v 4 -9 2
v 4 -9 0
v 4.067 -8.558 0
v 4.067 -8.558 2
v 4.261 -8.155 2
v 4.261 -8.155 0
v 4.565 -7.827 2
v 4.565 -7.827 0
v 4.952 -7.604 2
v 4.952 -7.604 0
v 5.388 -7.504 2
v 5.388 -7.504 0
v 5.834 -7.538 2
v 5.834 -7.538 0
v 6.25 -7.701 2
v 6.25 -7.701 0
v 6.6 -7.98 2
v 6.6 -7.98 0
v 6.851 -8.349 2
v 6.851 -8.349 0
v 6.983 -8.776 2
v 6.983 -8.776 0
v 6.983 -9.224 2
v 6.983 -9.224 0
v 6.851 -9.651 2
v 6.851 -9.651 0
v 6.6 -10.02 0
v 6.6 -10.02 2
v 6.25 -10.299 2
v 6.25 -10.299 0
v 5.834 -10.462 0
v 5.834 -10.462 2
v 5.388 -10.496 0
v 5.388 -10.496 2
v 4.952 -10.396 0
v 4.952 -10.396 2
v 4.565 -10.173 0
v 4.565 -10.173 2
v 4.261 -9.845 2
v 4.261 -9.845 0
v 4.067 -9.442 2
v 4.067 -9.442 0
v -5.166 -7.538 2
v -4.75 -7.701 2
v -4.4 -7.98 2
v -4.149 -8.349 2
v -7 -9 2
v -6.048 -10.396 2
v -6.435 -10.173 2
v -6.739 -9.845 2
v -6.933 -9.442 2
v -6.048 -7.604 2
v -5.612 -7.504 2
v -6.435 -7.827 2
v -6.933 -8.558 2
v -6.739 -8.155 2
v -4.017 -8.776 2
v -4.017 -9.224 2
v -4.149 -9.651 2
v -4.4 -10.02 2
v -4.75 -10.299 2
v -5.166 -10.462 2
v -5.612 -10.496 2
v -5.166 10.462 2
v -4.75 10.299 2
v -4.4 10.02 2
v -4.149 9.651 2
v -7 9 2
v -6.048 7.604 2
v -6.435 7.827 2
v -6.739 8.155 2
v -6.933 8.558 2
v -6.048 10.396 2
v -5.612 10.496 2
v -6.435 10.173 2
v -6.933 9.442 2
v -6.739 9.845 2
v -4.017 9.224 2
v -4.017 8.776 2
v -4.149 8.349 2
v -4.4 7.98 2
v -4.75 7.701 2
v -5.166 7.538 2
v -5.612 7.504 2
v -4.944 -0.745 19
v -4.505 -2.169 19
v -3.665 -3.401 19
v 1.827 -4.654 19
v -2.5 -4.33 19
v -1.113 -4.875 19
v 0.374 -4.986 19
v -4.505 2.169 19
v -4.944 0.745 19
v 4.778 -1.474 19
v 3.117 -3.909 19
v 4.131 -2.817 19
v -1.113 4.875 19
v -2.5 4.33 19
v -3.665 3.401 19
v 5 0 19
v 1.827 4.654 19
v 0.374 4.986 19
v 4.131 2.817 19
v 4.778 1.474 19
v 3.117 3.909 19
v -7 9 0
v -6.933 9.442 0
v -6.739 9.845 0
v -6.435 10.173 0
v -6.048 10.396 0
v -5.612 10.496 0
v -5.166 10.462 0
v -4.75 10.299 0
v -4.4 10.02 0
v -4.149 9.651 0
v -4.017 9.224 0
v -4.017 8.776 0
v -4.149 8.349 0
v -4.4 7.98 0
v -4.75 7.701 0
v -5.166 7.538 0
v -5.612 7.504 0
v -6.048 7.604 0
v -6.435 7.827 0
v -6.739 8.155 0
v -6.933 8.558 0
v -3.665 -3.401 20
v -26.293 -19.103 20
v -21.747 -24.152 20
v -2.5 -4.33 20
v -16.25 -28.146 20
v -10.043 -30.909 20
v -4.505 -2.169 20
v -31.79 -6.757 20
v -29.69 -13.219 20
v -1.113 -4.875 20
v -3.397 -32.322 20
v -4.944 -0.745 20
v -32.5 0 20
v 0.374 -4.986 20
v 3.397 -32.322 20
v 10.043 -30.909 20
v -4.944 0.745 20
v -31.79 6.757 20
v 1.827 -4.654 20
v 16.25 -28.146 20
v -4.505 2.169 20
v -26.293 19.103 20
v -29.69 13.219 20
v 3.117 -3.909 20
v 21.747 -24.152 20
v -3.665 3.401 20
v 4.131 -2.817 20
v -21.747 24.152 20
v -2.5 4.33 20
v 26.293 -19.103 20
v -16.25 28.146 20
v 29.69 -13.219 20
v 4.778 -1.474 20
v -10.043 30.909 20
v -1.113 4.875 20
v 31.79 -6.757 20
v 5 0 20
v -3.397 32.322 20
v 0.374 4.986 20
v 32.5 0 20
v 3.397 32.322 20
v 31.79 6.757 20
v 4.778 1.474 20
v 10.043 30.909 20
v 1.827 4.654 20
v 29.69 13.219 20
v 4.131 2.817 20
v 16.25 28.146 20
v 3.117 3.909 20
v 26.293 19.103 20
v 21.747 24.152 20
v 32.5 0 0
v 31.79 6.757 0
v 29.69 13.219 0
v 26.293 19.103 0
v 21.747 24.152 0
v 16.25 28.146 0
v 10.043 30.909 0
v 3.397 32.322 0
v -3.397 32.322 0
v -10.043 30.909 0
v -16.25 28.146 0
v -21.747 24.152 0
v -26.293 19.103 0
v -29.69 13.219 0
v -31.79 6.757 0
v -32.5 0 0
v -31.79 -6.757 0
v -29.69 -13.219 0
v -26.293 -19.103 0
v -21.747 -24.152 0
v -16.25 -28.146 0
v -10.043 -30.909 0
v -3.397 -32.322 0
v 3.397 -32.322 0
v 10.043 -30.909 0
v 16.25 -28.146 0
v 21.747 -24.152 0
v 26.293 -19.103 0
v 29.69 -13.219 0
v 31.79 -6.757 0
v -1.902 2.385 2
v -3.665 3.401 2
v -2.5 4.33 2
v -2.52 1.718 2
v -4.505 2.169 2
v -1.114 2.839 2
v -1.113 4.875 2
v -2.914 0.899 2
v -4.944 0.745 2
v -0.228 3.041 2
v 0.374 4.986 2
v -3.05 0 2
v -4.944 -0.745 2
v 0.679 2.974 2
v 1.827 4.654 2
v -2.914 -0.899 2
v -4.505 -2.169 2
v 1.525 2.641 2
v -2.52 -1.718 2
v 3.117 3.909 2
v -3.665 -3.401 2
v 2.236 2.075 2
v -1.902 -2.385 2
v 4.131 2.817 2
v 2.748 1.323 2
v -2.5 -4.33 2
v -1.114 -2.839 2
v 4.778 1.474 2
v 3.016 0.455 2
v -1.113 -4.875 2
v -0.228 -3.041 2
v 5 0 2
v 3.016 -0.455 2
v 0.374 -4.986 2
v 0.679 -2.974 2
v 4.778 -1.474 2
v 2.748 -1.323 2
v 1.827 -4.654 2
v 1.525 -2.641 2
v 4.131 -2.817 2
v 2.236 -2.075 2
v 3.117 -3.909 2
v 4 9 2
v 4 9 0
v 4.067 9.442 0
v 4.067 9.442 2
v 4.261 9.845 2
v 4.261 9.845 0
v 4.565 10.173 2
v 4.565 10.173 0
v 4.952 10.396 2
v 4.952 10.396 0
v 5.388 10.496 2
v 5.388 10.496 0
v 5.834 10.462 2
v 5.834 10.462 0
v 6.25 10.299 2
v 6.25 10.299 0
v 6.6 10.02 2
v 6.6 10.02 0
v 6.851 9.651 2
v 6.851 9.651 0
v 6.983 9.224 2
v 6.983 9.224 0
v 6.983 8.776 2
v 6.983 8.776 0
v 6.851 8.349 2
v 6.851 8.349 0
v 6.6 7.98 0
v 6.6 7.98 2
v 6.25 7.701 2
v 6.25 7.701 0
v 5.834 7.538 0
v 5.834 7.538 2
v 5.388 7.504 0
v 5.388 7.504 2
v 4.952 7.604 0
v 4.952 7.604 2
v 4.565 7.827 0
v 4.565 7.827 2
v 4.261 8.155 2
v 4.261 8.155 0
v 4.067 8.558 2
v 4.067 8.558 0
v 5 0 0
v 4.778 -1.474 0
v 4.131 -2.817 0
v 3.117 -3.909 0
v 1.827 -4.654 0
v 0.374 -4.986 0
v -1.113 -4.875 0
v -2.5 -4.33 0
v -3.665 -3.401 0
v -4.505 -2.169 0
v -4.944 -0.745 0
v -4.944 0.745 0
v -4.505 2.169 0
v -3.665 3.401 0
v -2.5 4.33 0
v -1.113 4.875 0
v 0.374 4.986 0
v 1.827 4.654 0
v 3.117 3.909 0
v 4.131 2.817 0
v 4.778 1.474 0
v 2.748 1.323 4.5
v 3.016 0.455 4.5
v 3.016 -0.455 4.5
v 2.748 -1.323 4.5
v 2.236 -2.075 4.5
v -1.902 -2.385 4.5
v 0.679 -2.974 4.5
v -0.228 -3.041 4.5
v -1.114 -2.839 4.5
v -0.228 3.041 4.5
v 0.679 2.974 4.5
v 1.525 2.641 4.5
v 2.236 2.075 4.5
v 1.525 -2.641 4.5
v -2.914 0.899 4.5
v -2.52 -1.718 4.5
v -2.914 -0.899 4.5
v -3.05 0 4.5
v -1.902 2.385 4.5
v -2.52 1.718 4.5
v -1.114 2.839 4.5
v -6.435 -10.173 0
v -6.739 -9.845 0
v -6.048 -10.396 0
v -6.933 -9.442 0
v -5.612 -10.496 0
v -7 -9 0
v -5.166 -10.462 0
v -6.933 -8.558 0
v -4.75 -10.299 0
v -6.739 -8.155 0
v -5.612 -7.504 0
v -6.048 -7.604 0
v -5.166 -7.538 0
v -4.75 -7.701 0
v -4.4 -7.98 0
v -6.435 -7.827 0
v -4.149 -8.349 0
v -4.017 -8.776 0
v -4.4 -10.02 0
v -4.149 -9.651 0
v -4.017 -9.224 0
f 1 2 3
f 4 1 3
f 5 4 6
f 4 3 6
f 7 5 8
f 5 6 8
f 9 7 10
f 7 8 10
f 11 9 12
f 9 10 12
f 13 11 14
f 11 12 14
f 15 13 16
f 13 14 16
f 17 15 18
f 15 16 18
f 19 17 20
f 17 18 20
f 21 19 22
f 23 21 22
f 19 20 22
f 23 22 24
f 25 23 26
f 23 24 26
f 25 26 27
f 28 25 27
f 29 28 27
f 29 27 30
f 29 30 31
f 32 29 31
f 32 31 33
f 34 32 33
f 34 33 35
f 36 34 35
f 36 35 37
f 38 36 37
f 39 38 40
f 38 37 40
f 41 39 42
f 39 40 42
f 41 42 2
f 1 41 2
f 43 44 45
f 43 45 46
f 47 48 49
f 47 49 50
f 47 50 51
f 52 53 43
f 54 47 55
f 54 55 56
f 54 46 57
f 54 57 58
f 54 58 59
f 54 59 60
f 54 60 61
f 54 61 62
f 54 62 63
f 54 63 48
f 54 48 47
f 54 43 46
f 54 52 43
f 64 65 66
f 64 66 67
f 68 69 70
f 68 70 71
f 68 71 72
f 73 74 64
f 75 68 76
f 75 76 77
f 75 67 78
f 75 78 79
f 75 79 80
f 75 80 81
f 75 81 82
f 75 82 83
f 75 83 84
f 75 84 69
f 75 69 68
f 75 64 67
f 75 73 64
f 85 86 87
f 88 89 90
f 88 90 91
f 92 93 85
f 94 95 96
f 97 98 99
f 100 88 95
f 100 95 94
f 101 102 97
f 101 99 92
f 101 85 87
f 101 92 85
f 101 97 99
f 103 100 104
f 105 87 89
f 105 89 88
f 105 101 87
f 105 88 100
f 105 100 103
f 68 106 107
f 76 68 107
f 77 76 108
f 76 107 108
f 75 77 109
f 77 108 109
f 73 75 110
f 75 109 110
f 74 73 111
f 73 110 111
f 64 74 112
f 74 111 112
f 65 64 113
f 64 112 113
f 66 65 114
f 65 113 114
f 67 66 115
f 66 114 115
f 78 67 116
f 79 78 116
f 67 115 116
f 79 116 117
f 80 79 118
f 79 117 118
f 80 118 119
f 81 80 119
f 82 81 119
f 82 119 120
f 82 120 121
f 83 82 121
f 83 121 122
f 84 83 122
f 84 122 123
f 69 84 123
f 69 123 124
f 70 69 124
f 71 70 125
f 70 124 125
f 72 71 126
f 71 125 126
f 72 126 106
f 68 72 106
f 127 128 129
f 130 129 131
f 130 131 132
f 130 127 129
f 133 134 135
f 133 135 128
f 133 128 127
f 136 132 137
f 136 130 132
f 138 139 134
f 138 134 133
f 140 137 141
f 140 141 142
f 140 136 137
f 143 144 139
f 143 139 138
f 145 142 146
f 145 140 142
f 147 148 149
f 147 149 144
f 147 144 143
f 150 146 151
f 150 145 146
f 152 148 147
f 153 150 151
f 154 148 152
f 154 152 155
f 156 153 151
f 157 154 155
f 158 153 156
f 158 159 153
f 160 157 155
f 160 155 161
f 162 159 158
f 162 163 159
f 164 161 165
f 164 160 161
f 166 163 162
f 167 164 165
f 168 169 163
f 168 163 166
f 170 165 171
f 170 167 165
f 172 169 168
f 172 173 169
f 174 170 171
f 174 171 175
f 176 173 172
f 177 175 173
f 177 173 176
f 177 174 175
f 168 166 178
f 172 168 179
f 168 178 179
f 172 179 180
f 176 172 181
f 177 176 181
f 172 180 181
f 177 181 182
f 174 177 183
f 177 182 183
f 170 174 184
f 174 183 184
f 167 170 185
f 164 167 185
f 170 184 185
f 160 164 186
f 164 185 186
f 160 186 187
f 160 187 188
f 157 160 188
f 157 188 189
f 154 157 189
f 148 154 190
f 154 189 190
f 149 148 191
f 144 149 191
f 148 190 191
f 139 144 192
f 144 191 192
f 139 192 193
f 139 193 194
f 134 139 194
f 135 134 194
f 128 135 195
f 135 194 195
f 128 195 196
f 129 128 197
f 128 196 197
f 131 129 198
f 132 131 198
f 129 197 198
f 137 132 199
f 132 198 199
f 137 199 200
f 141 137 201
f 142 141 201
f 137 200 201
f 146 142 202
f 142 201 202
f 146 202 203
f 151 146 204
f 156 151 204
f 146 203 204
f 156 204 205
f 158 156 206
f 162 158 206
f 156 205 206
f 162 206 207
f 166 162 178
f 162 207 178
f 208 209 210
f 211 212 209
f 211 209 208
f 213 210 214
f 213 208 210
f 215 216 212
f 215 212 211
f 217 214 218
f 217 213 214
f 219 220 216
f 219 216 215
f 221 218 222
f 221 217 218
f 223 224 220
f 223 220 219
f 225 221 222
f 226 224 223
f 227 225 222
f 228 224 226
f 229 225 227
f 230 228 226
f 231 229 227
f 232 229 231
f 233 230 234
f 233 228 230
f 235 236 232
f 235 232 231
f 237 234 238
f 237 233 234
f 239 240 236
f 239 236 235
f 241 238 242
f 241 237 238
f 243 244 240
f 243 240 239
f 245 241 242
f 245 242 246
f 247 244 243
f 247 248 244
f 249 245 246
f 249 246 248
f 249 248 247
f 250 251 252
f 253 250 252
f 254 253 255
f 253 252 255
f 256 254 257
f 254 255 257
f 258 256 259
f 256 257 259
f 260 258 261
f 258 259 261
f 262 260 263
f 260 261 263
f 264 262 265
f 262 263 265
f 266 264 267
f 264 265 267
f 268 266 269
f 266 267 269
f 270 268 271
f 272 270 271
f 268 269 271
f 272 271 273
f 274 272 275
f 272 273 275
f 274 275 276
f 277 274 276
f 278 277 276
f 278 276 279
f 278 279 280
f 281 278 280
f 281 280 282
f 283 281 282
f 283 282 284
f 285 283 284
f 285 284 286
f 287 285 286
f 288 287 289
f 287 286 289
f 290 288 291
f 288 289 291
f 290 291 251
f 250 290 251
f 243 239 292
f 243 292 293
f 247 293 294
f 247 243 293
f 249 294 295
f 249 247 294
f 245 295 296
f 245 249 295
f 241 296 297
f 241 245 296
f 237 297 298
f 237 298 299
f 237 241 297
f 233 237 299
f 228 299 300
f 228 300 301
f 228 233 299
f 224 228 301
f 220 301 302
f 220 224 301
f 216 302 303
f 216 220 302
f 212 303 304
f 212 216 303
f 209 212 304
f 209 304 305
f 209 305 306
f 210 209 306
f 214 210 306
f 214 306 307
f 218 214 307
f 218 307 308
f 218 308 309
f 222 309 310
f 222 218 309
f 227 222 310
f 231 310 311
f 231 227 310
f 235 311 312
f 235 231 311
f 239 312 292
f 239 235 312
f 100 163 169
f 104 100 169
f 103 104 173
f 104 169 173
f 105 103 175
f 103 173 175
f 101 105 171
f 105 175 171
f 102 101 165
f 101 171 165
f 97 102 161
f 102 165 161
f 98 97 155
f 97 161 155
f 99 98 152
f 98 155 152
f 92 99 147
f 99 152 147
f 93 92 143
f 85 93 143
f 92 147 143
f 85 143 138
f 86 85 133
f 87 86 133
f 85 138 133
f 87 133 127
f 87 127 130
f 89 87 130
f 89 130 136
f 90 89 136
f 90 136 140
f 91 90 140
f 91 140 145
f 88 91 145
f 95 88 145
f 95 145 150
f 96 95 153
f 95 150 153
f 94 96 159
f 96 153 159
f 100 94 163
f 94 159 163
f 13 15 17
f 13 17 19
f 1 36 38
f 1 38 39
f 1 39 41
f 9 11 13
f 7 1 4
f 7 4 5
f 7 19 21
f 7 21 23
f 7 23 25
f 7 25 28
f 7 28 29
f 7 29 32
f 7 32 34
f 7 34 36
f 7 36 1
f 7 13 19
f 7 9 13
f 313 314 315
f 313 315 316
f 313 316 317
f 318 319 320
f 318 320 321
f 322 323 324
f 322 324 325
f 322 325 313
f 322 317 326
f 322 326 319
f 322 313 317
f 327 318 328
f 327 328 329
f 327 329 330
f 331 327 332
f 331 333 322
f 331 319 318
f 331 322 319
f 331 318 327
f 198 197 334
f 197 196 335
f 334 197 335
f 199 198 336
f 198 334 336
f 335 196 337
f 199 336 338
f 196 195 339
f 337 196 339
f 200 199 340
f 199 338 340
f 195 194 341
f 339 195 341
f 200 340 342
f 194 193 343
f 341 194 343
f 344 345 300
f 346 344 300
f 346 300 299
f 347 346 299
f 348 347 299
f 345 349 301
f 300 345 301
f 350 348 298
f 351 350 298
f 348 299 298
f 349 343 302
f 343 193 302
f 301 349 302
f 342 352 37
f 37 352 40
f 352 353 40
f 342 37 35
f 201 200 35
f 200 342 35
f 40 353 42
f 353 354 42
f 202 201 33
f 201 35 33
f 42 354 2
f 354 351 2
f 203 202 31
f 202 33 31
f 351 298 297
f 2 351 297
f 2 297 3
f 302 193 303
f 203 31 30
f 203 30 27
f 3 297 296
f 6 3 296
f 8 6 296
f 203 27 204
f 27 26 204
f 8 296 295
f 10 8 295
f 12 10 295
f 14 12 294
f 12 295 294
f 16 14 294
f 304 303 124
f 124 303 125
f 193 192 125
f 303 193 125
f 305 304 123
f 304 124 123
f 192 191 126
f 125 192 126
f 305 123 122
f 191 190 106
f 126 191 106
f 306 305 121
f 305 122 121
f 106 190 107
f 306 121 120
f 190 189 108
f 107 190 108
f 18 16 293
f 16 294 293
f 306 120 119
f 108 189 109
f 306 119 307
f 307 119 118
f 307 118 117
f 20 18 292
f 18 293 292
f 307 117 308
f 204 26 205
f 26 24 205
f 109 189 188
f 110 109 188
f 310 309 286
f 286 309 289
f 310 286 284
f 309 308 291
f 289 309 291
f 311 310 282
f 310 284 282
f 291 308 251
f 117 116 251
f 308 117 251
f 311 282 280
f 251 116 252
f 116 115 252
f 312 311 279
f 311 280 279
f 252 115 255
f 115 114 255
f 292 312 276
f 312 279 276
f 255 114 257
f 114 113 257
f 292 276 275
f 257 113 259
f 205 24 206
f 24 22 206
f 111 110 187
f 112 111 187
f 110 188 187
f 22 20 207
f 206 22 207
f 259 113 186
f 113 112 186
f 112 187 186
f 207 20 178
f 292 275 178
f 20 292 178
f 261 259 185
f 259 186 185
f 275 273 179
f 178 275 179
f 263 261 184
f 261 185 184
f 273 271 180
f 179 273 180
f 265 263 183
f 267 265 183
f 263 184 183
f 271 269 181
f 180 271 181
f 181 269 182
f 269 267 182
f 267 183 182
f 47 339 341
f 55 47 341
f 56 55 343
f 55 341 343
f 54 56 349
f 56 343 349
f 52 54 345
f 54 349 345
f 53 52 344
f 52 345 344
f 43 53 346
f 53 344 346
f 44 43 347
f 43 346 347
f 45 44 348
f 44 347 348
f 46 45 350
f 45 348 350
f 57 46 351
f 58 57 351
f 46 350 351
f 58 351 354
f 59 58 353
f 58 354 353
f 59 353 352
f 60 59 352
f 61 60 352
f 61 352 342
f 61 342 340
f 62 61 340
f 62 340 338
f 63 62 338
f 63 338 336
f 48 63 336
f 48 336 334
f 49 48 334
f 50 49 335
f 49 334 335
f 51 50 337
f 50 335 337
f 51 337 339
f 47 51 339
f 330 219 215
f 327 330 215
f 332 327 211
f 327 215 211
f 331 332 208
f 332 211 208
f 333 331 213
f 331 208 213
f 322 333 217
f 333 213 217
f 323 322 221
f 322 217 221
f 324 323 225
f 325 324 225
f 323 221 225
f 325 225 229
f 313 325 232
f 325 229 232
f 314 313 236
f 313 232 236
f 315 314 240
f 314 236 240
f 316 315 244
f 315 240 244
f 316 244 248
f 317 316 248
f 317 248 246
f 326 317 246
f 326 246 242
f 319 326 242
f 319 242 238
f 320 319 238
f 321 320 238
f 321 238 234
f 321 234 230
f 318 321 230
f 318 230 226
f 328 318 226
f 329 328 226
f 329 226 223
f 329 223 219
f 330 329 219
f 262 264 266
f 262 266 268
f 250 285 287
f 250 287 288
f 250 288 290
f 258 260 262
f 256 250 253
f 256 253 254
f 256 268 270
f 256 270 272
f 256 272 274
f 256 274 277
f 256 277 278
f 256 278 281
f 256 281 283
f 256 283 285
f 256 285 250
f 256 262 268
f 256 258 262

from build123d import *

# Parameters (mm, degrees)
SKETCH1_R           = 32.5
BOSS_EXTRUDE1_DEPTH = 20
SKETCH2_R           = 5
CUT_EXTRUDE1_DEPTH  = 1
SKETCH4_R           = 3.05
CUT_EXTRUDE2_DEPTH  = 4.5
SKETCH3_R           = 1.5
CUT_EXTRUDE3_DEPTH  = 2
CUT_EXTRUDE4_START  = -2
SKETCH5_R           = 5
CUT_EXTRUDE4_DEPTH  = 2


with BuildPart() as part:
    # Sketch1 → Boss-Extrude1 (new body)
    with BuildSketch(Plane.XY):
        Circle(SKETCH1_R)
    extrude(amount=BOSS_EXTRUDE1_DEPTH)

    # Sketch2 → Cut-Extrude1 (cut)
    with BuildSketch(Plane.XY.offset(20)):
        Circle(SKETCH2_R)
    extrude(amount=-CUT_EXTRUDE1_DEPTH, mode=Mode.SUBTRACT)

    # Sketch4 → Cut-Extrude2 (cut)
    with BuildSketch(Plane(origin=(0, 0, 0), x_dir=(-1, 0, 0), z_dir=(0, 0, -1))):
        Circle(SKETCH4_R)
    extrude(amount=-CUT_EXTRUDE2_DEPTH, mode=Mode.SUBTRACT)

    # Sketch3 → Cut-Extrude3 (cut)
    with BuildSketch(Plane(origin=(0, 0, 0), x_dir=(-1, 0, 0), z_dir=(0, 0, -1))):
        with Locations((5.5, 9)):
            Circle(SKETCH3_R)
        with Locations((-5.5, 9)):
            Circle(SKETCH3_R)
        with Locations((5.5, -9)):
            Circle(SKETCH3_R)
        with Locations((-5.5, -9)):
            Circle(SKETCH3_R)
    extrude(amount=-CUT_EXTRUDE3_DEPTH, mode=Mode.SUBTRACT)

    # Sketch5 → Cut-Extrude4 (cut)
    with BuildSketch(Plane(origin=(0, 0, 0), x_dir=(-1, 0, 0), z_dir=(0, 0, -1)).offset(CUT_EXTRUDE4_START)):
        with Locations(Location((0, 0, 0), (0, 0, 180))):
            Circle(SKETCH5_R)
    extrude(amount=CUT_EXTRUDE4_DEPTH, mode=Mode.SUBTRACT)


solid = part.part
